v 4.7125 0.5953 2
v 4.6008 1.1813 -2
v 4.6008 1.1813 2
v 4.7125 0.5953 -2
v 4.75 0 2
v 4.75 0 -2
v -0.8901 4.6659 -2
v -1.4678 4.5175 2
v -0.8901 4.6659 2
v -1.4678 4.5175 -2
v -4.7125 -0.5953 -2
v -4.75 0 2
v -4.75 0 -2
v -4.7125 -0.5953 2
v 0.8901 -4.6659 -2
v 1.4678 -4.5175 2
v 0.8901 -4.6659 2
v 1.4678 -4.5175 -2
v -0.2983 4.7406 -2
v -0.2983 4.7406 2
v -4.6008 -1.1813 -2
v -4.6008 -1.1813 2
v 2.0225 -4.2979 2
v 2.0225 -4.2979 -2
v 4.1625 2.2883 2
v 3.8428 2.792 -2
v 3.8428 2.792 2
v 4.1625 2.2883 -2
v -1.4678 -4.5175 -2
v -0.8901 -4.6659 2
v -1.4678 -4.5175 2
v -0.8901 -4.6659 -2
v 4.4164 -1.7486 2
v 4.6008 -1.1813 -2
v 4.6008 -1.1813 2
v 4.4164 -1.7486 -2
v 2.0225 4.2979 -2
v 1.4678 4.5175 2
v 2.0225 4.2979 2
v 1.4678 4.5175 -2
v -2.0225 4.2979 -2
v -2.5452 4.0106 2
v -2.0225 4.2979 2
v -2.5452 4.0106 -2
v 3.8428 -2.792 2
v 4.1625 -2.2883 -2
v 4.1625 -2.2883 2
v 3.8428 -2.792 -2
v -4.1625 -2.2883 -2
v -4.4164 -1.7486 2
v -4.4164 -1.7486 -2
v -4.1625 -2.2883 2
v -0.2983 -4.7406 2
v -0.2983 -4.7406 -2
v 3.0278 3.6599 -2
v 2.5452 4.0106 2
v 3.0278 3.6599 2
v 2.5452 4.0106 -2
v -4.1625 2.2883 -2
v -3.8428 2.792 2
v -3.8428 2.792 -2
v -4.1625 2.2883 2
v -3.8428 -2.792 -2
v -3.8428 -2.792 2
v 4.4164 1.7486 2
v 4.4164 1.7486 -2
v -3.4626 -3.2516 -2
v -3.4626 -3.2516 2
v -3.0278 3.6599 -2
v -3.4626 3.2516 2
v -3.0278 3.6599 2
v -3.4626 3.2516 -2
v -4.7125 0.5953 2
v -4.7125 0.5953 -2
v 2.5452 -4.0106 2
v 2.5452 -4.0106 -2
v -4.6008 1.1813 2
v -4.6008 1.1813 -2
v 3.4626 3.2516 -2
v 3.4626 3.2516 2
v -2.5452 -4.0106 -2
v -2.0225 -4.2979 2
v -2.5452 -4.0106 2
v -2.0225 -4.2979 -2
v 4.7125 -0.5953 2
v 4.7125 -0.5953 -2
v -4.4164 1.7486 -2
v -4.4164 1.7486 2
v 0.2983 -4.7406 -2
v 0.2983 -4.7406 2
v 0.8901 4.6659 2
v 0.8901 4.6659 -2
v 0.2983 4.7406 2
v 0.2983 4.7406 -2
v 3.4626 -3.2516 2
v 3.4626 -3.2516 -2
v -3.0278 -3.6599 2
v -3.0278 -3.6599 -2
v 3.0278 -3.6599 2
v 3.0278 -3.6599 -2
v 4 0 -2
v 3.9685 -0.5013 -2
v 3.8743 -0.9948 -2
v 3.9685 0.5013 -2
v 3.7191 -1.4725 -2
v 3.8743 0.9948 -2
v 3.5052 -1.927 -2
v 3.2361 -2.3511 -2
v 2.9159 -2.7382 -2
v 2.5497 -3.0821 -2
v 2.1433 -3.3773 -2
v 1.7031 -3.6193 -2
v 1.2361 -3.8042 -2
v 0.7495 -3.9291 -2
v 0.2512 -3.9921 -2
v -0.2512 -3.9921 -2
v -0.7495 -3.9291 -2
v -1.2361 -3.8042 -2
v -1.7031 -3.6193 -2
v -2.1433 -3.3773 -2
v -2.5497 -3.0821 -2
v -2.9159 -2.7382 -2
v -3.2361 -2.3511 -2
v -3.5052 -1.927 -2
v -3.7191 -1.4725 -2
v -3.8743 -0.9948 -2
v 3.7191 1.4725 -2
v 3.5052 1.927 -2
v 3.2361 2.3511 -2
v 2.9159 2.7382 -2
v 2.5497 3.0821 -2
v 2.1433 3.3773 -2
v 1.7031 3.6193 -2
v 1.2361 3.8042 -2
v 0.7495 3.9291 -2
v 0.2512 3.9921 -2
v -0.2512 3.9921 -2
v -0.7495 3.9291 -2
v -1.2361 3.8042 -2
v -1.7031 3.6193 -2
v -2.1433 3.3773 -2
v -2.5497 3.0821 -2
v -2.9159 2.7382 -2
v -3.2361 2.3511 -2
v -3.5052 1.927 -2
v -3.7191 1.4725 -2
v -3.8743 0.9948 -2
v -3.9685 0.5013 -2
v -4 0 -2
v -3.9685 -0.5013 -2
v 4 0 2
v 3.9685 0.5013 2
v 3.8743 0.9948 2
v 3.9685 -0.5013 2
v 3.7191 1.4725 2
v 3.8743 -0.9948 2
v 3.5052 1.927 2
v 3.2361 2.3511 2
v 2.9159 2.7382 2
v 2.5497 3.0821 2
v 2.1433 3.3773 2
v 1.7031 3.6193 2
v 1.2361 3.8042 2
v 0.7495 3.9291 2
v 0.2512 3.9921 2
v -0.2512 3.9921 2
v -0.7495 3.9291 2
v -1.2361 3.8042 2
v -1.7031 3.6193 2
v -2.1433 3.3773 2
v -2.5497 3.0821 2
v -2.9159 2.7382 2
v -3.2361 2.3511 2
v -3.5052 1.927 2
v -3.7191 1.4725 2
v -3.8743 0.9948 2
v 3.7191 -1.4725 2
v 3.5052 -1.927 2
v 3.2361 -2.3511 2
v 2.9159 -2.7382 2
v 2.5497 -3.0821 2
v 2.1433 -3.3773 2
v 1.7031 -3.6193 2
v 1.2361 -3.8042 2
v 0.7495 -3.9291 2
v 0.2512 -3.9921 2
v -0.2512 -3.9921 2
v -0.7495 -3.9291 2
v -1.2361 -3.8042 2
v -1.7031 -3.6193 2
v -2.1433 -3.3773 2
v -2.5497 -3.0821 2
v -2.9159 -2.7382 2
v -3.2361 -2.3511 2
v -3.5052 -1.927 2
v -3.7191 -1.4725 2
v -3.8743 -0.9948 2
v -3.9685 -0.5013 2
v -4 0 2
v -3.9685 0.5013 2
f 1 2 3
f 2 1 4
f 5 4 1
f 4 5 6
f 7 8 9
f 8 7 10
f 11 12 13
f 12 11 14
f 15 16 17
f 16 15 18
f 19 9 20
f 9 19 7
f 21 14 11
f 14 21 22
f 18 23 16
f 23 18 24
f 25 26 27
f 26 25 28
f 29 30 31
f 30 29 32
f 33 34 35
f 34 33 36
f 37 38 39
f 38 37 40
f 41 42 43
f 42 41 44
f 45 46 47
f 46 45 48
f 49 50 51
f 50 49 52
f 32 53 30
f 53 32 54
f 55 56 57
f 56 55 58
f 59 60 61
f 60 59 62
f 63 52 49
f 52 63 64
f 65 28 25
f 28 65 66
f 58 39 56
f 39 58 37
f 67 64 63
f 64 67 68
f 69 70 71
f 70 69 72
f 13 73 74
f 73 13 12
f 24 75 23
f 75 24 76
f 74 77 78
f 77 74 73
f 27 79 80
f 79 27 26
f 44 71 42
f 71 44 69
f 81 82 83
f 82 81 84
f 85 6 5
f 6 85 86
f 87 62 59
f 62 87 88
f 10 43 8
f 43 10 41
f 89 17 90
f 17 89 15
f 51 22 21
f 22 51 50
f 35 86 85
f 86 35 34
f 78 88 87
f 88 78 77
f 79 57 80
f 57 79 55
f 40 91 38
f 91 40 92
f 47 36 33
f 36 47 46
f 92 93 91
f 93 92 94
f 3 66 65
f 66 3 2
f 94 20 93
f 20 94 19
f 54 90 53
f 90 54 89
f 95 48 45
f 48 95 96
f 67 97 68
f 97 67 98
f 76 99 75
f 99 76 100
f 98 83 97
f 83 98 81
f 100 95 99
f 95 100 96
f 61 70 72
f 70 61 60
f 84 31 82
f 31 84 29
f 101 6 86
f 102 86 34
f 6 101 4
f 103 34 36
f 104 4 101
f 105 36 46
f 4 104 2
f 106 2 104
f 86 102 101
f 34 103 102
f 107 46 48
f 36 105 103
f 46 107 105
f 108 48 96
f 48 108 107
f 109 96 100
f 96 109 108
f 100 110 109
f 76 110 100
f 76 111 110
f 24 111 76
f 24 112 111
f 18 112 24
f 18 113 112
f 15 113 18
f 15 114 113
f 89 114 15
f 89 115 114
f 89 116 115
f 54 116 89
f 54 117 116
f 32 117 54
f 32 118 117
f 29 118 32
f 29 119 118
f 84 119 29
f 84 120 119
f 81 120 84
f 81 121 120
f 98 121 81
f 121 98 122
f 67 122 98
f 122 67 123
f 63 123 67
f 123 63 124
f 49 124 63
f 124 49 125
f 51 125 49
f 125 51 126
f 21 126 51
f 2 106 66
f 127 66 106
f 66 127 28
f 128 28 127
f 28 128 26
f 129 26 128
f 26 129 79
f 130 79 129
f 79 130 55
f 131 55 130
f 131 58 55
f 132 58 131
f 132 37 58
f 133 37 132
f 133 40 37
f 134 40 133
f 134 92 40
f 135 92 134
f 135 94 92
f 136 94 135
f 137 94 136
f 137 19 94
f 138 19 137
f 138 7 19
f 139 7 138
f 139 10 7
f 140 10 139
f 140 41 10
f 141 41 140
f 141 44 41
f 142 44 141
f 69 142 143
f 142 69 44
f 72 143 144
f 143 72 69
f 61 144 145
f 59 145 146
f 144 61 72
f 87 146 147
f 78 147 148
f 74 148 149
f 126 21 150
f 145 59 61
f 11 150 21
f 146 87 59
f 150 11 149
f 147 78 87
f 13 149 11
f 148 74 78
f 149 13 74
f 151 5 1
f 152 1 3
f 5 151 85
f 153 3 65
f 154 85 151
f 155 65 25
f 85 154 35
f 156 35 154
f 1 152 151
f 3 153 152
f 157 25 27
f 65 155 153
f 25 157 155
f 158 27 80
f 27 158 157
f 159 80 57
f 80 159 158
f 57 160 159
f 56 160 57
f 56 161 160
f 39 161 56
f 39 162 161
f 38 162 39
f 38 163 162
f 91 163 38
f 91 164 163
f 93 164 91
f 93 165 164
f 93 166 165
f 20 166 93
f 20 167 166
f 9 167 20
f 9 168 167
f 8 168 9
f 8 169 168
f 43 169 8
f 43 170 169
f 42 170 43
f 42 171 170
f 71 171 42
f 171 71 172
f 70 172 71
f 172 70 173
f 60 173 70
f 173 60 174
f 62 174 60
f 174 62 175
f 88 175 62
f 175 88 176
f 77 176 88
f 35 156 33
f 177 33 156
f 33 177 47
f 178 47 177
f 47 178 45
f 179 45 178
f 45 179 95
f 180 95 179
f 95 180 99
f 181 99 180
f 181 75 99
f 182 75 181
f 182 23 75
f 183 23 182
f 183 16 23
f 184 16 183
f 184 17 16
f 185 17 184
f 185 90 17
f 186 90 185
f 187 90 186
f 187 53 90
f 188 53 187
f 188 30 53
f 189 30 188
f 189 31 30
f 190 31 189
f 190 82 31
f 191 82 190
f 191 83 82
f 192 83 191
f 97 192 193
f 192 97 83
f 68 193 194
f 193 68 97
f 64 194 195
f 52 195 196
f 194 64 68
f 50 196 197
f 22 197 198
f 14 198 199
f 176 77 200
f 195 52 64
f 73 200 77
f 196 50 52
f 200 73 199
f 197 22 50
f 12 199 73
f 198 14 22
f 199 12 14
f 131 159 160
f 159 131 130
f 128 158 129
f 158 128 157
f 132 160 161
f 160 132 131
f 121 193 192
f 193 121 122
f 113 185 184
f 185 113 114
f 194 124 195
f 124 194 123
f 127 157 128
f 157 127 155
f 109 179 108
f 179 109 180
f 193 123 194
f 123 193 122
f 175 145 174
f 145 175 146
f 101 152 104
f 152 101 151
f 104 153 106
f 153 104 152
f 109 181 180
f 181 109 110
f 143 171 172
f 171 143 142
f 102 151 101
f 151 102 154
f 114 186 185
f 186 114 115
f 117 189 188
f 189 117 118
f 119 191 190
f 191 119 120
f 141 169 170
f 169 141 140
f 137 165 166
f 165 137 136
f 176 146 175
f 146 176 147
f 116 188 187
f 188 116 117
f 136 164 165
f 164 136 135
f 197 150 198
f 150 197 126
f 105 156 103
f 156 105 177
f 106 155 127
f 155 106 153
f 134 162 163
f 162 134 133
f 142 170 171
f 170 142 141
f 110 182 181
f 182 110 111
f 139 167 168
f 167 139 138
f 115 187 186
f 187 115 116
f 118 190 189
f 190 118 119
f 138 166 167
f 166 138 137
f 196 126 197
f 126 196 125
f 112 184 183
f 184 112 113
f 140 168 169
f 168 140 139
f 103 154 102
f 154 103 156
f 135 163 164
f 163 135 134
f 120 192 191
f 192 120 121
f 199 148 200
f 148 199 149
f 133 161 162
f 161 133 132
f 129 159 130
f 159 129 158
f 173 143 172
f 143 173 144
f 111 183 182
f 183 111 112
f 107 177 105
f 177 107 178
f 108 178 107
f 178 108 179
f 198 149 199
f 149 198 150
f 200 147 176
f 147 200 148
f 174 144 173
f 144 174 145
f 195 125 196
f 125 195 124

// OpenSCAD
$fn = 50;


difference() {
	union() {
		translate(v = [0, 0, -2.0000000000]) {
			cylinder(h = 4, r = 4.7500000000);
		}
	}
	union() {
		translate(v = [0, 0, -100.0000000000]) {
			cylinder(h = 200, r = 4.0000000000);
		}
	}
}
